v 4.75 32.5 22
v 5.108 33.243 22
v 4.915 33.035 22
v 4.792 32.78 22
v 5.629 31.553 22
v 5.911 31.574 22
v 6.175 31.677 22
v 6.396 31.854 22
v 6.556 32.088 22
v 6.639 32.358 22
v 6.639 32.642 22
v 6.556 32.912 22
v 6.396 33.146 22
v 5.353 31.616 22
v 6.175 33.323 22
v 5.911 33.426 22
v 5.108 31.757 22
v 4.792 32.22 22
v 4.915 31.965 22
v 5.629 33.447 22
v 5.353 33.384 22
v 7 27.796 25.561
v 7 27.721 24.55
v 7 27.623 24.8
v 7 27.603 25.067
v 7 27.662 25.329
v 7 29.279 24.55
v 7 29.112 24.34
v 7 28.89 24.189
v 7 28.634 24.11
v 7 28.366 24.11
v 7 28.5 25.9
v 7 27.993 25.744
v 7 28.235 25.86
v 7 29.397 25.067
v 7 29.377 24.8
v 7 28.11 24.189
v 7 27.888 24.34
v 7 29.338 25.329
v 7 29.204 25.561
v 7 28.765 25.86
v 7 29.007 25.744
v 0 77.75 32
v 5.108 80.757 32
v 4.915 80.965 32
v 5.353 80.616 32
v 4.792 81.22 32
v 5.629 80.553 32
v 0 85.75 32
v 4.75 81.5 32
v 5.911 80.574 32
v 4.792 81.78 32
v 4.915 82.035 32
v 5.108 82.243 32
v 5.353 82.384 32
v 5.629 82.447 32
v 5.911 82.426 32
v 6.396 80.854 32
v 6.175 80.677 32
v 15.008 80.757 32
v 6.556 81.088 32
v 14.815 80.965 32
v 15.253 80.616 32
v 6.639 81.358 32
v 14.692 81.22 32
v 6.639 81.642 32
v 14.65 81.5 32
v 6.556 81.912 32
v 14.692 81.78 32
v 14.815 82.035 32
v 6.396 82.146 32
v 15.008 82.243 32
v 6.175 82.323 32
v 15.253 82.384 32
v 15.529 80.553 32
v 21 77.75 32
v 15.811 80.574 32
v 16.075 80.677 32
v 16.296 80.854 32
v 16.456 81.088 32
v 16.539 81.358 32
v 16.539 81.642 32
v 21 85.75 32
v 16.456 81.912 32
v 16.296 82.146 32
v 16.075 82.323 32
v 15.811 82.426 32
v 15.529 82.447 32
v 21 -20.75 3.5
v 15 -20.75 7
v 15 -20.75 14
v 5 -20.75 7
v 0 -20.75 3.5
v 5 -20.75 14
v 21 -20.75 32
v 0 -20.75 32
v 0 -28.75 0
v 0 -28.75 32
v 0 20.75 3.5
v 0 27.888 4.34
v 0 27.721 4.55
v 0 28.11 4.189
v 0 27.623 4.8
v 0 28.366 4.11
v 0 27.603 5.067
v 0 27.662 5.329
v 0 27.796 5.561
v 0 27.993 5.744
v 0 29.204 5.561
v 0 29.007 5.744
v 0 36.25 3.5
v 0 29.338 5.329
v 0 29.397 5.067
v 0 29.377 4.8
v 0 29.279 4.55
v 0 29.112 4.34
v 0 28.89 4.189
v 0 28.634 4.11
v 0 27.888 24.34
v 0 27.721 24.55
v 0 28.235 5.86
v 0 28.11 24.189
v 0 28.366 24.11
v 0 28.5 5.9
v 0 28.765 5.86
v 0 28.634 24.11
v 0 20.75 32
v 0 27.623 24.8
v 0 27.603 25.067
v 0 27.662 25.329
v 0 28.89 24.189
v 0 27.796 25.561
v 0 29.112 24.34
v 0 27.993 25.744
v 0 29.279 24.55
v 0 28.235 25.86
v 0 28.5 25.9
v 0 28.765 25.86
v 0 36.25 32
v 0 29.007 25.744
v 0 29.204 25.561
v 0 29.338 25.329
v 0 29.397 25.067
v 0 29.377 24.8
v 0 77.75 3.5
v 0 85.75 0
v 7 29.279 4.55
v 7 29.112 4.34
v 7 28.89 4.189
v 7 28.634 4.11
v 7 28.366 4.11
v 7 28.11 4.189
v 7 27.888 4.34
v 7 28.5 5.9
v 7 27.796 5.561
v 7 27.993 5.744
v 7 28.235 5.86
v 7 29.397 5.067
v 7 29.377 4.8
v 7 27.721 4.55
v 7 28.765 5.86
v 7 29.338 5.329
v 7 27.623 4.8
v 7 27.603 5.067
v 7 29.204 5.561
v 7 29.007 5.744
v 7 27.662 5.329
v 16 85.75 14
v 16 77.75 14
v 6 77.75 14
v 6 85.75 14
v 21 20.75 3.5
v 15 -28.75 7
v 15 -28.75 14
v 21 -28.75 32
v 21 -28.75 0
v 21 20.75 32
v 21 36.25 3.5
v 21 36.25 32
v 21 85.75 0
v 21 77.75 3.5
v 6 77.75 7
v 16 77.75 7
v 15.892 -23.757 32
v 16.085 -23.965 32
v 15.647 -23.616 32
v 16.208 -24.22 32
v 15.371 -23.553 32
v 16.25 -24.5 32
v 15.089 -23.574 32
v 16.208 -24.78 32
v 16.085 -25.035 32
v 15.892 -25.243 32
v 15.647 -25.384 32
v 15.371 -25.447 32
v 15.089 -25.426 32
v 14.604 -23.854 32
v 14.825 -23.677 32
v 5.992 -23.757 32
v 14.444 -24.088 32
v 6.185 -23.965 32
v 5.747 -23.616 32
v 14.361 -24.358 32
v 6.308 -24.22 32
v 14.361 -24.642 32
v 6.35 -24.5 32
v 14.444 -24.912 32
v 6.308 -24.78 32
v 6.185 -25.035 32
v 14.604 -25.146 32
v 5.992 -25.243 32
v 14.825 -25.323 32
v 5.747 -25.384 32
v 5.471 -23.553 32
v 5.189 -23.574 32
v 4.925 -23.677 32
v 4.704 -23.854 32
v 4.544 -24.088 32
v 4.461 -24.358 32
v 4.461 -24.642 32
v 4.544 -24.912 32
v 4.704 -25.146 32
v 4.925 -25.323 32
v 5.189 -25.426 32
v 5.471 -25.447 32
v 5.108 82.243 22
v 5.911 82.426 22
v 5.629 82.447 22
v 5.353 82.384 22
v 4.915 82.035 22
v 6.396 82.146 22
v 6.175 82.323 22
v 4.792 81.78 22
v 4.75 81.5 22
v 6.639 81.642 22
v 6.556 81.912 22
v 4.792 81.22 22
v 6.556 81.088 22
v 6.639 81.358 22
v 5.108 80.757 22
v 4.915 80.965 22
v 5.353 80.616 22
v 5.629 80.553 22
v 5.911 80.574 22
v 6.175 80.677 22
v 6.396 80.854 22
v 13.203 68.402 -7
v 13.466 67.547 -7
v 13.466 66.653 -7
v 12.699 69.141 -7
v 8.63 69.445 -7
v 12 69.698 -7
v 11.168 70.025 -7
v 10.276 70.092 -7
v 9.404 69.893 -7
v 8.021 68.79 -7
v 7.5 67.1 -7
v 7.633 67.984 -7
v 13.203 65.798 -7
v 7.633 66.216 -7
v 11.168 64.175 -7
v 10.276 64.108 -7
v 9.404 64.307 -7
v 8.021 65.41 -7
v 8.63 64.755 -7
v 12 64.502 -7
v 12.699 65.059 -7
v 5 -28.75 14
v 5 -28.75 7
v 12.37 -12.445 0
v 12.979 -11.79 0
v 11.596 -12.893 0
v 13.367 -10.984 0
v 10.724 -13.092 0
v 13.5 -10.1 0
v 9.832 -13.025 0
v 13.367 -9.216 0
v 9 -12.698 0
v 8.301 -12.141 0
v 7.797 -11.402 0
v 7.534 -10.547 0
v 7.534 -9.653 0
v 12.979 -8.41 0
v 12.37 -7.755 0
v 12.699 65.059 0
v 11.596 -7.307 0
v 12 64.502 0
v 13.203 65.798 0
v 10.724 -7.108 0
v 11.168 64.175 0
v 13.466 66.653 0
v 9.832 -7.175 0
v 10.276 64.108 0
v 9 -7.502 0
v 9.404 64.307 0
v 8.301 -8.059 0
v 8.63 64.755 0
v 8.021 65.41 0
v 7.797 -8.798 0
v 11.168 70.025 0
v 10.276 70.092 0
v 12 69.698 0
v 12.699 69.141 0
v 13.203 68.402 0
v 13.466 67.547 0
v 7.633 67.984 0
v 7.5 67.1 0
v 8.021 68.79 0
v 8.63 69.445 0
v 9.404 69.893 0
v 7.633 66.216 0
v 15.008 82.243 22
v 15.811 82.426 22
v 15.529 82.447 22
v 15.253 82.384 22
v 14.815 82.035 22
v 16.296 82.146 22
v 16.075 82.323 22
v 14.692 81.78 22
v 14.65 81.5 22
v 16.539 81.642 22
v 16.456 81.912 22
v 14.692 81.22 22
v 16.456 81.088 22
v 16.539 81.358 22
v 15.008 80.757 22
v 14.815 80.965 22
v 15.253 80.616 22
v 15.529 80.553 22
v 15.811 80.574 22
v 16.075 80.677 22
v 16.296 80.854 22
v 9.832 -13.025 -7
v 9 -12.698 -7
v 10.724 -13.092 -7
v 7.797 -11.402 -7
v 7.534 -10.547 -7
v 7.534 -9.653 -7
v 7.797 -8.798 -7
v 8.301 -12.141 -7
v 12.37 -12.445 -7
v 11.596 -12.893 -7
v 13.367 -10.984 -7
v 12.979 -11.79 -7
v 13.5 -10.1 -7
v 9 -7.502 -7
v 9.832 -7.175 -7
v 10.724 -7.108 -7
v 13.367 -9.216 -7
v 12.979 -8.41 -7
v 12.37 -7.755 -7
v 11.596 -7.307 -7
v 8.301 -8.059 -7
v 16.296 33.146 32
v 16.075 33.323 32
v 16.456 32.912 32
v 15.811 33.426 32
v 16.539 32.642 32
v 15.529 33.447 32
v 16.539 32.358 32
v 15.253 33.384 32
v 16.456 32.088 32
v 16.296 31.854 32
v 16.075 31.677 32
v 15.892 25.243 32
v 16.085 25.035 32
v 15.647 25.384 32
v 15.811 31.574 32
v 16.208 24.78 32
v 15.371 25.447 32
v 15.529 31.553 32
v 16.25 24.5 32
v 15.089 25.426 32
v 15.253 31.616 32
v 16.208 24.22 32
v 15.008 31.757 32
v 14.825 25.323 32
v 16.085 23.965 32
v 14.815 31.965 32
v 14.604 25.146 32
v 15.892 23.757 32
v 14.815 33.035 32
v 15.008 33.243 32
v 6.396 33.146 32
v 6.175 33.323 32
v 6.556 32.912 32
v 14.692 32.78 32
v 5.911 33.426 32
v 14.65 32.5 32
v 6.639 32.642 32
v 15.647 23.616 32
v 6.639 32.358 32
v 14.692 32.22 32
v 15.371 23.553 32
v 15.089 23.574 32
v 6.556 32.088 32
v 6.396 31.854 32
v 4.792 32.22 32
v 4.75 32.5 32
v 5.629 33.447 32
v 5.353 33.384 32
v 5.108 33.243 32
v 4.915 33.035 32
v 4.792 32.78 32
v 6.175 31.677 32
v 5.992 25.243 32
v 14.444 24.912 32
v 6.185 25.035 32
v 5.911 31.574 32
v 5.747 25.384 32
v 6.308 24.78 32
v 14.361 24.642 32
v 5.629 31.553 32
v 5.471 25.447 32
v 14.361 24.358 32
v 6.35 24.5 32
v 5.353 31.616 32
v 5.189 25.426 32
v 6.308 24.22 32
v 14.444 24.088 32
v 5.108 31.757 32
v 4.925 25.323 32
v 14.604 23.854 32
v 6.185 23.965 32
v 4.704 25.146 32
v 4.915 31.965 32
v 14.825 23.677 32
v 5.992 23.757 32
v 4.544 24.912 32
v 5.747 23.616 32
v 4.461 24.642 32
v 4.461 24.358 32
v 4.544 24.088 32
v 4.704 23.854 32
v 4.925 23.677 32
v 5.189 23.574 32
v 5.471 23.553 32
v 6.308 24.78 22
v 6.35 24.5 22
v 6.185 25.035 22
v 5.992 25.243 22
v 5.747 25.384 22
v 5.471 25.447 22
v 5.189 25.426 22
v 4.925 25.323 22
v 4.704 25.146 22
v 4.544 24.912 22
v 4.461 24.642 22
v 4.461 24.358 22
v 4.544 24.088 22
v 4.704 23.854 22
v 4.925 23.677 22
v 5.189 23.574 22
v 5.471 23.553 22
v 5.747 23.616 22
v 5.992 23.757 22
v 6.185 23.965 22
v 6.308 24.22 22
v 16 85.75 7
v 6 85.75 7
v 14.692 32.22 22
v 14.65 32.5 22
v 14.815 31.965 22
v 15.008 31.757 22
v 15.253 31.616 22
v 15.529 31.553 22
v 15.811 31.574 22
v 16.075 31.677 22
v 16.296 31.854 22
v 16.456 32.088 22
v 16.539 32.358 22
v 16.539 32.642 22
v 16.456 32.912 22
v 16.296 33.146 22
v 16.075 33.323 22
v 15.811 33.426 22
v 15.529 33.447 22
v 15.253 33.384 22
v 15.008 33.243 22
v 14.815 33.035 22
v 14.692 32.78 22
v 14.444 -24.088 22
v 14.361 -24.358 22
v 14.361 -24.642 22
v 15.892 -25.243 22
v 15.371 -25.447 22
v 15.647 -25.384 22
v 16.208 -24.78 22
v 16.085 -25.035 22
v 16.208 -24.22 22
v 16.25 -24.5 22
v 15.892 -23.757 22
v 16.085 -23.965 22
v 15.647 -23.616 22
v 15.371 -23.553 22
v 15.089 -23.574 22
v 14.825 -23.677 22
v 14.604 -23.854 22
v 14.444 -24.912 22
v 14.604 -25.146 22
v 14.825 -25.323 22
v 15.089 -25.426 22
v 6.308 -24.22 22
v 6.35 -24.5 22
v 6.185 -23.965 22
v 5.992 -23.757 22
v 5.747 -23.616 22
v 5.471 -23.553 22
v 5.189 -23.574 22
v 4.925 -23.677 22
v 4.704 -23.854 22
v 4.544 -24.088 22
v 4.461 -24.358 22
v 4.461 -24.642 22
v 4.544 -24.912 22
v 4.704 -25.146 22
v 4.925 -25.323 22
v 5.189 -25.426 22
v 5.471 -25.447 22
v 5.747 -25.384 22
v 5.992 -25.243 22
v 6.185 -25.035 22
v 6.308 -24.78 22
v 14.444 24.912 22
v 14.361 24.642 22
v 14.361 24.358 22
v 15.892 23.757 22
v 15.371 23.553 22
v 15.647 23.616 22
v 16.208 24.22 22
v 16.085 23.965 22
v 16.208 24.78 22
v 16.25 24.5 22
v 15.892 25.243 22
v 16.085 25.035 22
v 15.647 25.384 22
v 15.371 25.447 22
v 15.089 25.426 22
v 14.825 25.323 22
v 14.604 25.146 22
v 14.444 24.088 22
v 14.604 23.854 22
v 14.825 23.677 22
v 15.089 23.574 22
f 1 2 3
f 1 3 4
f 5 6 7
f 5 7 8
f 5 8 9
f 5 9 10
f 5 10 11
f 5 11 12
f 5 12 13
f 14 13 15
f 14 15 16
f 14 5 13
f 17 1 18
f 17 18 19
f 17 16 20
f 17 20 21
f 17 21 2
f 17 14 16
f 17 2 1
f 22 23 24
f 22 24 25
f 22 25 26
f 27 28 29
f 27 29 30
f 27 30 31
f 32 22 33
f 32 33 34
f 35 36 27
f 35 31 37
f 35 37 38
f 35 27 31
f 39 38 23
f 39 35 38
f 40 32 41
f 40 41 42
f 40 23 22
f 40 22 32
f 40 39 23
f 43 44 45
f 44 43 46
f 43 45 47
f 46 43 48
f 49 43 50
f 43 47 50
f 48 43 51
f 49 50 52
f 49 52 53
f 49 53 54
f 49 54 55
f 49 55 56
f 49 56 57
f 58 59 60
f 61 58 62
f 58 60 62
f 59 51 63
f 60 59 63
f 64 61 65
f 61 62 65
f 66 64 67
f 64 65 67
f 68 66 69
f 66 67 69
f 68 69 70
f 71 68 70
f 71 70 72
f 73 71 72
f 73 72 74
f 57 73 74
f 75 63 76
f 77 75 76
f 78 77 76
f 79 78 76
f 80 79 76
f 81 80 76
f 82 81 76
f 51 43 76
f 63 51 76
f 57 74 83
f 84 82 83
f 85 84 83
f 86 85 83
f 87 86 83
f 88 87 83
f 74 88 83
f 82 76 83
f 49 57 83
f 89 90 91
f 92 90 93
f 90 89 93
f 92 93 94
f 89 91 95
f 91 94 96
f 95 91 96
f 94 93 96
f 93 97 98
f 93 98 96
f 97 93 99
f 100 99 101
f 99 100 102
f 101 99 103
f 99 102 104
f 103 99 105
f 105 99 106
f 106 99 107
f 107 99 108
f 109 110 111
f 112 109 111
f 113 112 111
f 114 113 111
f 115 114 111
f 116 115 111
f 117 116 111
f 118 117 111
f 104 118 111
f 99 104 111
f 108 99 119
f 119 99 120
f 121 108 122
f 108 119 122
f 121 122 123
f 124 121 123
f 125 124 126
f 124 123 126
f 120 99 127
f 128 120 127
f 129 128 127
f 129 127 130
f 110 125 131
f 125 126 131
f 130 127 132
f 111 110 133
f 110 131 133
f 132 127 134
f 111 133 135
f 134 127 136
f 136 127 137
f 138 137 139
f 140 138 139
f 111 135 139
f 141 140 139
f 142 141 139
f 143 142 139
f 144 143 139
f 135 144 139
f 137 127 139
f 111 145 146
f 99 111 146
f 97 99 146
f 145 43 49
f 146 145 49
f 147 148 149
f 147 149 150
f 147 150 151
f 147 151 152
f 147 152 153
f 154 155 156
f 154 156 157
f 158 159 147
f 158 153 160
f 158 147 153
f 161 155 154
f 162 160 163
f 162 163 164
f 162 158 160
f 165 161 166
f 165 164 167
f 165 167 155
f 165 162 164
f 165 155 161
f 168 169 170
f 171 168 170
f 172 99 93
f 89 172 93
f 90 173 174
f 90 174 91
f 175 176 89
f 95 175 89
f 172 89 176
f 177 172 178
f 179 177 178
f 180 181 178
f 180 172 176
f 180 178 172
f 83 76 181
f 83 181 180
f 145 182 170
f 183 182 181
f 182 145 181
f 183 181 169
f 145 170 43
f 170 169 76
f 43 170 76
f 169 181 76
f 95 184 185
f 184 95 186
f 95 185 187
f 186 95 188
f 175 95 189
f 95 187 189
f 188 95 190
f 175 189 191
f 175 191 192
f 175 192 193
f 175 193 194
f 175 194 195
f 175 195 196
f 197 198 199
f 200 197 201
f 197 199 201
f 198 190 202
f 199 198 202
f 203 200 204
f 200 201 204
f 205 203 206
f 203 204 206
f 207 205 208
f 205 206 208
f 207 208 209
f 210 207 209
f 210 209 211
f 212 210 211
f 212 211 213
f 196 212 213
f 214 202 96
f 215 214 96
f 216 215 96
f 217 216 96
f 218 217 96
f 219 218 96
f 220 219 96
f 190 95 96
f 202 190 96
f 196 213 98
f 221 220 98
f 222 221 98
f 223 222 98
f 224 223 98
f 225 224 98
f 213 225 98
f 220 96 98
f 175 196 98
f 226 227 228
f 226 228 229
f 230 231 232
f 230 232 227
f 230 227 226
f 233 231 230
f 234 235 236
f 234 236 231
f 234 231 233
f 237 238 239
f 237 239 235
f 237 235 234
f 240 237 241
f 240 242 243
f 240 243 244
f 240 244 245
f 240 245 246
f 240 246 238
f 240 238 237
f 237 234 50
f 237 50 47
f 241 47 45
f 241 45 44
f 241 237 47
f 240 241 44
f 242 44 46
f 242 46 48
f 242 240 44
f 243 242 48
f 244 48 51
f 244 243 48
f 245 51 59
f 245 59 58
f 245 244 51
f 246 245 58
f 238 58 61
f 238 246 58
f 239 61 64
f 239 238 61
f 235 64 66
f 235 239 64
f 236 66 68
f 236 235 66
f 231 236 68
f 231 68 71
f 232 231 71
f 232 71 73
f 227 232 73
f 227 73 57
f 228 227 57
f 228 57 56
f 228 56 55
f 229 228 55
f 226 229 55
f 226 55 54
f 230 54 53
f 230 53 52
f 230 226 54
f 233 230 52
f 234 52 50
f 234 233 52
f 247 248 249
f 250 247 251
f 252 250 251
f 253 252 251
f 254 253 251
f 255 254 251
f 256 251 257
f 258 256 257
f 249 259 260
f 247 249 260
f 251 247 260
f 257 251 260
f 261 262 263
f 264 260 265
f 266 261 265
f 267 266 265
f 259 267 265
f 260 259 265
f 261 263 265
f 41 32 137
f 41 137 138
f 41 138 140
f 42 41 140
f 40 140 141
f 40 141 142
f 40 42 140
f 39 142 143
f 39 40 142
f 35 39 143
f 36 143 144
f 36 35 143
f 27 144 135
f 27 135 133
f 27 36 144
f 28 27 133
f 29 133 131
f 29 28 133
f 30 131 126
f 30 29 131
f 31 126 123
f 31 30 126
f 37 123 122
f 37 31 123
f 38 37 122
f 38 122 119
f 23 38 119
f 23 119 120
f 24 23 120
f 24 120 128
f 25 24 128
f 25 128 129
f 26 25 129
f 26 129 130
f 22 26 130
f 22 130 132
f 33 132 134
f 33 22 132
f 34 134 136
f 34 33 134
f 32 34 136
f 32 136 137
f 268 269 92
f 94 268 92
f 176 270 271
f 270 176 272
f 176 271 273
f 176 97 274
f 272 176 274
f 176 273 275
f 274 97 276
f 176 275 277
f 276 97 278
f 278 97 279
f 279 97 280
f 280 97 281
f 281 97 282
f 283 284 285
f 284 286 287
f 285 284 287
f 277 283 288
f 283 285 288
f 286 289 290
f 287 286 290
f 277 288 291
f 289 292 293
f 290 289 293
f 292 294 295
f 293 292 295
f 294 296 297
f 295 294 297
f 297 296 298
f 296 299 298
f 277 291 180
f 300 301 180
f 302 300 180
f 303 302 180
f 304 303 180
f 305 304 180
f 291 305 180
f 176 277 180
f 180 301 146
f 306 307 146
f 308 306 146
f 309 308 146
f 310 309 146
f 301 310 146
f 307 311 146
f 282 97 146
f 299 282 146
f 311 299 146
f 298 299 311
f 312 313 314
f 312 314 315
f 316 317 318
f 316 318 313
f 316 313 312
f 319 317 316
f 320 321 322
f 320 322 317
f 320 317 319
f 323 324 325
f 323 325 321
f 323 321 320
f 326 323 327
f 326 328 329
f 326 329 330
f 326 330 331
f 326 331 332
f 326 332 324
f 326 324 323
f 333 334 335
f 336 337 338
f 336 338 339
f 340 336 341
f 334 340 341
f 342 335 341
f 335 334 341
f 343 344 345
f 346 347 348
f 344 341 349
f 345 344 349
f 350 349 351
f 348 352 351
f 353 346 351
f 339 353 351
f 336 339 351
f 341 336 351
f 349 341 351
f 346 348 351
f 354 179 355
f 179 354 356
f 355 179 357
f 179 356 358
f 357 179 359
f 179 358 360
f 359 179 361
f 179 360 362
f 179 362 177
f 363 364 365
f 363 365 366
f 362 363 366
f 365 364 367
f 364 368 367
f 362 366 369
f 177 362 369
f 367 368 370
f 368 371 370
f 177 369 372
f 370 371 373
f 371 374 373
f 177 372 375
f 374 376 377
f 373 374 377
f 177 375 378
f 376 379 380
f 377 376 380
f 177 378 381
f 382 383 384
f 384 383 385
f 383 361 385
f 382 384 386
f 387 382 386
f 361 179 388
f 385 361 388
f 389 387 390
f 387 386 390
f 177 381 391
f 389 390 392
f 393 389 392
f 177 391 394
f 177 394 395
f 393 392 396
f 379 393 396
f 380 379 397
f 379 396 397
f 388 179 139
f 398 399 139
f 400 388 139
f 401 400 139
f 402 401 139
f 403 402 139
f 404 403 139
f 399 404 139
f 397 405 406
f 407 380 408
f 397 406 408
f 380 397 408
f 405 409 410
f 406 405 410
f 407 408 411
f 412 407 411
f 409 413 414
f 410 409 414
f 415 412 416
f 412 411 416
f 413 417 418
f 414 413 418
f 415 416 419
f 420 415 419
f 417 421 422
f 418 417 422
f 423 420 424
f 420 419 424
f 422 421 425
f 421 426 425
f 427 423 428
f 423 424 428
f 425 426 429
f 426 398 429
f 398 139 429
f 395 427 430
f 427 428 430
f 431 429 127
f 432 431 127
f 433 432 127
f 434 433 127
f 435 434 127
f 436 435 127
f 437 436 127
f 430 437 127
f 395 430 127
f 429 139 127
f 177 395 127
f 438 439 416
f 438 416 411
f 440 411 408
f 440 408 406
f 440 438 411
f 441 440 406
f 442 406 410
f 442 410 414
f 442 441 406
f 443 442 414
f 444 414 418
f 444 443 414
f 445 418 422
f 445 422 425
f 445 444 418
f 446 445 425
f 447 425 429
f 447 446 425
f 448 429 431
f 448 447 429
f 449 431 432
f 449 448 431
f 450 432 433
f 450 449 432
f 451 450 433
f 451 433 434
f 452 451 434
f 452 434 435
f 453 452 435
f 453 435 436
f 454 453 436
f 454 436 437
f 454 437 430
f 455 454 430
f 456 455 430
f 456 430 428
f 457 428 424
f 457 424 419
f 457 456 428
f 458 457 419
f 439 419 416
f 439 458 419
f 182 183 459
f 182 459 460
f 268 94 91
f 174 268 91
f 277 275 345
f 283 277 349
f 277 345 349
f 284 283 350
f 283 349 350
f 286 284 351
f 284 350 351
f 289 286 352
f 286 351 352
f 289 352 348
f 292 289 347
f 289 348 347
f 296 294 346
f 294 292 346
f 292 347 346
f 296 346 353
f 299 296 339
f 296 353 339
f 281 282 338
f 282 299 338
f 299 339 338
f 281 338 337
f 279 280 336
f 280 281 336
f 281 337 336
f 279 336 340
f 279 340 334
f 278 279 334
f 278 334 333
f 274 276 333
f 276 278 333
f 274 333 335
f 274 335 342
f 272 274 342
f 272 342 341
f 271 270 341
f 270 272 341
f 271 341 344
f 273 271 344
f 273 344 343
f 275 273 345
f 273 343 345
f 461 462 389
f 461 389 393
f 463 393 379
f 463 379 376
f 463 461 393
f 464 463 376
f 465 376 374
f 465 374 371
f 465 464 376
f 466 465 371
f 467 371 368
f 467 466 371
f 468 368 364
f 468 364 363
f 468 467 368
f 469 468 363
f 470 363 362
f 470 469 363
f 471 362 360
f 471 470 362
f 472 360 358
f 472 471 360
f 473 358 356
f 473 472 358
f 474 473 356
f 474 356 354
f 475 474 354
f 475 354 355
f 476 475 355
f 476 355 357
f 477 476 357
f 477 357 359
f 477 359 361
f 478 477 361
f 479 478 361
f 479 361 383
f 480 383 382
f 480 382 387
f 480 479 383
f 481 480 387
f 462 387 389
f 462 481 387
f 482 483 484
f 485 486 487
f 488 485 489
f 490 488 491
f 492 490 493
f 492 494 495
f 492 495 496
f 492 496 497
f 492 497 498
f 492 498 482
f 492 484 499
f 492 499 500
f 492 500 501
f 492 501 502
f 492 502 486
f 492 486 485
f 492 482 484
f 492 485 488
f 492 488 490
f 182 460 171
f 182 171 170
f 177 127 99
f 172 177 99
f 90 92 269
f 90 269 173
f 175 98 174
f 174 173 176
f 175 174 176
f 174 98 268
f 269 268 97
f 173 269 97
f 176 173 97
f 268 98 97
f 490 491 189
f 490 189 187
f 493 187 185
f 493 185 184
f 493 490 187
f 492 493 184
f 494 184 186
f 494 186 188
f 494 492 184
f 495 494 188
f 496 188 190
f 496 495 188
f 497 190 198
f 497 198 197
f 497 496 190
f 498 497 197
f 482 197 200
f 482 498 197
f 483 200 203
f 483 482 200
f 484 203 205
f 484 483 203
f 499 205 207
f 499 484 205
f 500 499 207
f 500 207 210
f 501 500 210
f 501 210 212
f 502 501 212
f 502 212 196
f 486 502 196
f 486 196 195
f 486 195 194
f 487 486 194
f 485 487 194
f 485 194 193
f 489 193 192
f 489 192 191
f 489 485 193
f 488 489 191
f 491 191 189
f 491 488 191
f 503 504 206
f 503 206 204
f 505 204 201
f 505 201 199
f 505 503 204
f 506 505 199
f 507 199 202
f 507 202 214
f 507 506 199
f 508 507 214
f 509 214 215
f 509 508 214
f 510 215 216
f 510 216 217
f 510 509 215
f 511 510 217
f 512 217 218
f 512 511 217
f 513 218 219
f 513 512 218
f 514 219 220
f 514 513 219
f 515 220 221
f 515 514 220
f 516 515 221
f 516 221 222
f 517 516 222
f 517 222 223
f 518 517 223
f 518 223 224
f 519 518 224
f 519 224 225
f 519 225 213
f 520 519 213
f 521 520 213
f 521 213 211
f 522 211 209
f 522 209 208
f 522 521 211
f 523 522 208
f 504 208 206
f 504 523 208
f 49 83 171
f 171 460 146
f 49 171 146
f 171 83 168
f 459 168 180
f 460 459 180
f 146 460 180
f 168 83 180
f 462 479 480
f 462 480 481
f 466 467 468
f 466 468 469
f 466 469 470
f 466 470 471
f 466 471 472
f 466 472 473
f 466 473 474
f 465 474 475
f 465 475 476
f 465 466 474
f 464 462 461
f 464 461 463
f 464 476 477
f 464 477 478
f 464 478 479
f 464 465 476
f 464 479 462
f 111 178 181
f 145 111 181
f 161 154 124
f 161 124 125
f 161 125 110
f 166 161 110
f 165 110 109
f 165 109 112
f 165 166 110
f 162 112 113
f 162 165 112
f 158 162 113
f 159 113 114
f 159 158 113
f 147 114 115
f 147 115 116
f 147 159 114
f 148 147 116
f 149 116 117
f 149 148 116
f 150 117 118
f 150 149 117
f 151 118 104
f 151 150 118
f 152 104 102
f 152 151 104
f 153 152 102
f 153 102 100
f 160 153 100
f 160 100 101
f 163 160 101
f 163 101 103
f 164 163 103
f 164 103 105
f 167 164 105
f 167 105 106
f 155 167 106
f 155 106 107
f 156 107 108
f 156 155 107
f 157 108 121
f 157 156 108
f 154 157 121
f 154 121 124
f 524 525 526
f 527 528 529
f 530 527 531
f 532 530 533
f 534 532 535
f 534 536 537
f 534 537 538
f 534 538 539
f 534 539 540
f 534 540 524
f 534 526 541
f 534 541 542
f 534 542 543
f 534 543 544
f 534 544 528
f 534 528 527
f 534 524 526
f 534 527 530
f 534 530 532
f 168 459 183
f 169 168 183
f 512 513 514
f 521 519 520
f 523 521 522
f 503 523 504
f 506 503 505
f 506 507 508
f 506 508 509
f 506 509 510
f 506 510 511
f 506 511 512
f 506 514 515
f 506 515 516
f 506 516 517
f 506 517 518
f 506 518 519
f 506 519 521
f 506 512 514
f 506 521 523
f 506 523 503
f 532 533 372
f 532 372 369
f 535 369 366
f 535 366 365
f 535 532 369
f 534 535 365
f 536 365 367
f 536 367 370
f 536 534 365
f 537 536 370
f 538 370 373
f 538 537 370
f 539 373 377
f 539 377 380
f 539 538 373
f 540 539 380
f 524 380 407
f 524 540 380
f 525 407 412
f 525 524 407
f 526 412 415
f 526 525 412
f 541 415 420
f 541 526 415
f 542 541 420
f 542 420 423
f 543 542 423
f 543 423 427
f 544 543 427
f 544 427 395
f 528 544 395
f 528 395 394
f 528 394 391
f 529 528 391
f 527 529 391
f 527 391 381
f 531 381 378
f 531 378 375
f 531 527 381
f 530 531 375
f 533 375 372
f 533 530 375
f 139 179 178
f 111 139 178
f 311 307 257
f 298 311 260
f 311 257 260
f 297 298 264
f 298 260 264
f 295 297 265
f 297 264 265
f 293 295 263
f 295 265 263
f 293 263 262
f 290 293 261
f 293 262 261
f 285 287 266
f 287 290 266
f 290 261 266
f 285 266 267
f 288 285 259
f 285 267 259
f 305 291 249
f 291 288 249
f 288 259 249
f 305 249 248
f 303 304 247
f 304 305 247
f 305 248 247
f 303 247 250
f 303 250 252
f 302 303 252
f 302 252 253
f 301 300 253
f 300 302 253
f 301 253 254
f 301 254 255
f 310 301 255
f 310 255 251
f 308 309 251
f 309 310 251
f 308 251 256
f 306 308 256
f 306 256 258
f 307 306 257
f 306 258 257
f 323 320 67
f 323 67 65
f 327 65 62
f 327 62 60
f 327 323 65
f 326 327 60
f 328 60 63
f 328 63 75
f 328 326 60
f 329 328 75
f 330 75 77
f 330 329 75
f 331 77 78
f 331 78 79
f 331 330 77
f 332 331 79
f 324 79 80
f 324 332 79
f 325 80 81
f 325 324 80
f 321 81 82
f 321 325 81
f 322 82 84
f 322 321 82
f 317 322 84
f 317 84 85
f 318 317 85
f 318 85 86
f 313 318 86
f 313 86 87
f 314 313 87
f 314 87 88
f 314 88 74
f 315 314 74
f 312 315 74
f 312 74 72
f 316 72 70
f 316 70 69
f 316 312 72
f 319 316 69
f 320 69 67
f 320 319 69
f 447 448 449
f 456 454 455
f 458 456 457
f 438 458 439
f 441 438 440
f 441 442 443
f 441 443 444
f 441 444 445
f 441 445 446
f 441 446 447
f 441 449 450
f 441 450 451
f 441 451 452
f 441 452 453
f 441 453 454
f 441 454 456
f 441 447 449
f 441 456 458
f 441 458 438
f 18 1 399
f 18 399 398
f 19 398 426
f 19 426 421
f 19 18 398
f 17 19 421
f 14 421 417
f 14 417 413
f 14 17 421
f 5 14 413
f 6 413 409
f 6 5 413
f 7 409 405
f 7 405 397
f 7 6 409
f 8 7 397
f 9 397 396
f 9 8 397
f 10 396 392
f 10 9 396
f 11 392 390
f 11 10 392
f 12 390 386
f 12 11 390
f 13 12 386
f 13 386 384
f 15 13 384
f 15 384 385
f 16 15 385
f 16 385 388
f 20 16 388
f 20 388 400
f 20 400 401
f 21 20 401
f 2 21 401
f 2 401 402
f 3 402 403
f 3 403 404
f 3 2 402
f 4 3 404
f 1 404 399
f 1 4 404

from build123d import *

# Parameters (mm, degrees)
CYLINDER050_R             = 0.9
CYLINDER050_DEPTH         = 7
CYLINDER051_R             = 0.9
CYLINDER051_DEPTH         = 7
CYLINDER043_R             = 0.95
CYLINDER043_DEPTH         = 10
CYLINDER044_R             = 0.95
CYLINDER044_DEPTH         = 10
CYLINDER041_R             = 0.95
CYLINDER041_DEPTH         = 10
CYLINDER042_R             = 0.95
CYLINDER042_DEPTH         = 10
BOX007_W                  = 10
BOX007_H                  = 10
BOX007_DEPTH              = 7
PAD016_DEPTH              = 21
CYLINDER040_R             = 3
CYLINDER040_DEPTH         = 10
CYLINDER048_R             = 0.95
CYLINDER048_DEPTH         = 10
CYLINDER049_R             = 0.95
CYLINDER049_DEPTH         = 10
CYLINDER046_R             = 0.95
CYLINDER046_DEPTH         = 10
CYLINDER047_R             = 0.95
CYLINDER047_DEPTH         = 10
BOX008_W                  = 10
BOX008_H                  = 10
BOX008_DEPTH              = 7
PAD017_DEPTH              = 21
CYLINDER045_R             = 3
CYLINDER045_DEPTH         = 10
FUSION040_PLACEMENT_ANGLE = 180


with BuildPart() as cylinder050:
    # Cylinder050 → Cylinder050 (new body)
    with BuildSketch(Plane(origin=(7, 28.5, 25), x_dir=(0, 0, 1), z_dir=(-1, 0, 0))):
        Circle(CYLINDER050_R)
    extrude(amount=CYLINDER050_DEPTH)


with BuildPart() as fusion042:
    # Cylinder051 → Cylinder051 (new body)
    with BuildSketch(Plane(origin=(7, 28.5, 5), x_dir=(0, 0, 1), z_dir=(-1, 0, 0))):
        Circle(CYLINDER051_R)
    extrude(amount=CYLINDER051_DEPTH)

    # Fusion042: union Cylinder050
    add(cylinder050.part)


with BuildPart() as cylinder043:
    # Cylinder043 → Cylinder043 (new body)
    with BuildSketch(Plane(origin=(9.9, 0, 0), x_dir=(1, 0, 0), z_dir=(0, 0, 1))):
        Circle(CYLINDER043_R)
    extrude(amount=CYLINDER043_DEPTH)


with BuildPart() as tornillos015:
    # Cylinder044 → Cylinder044 (new body)
    with BuildSketch(Plane.XY):
        Circle(CYLINDER044_R)
    extrude(amount=CYLINDER044_DEPTH)

    # Fusion034: union Cylinder043
    add(cylinder043.part)


with BuildPart() as tornillos015_1:
    # Fusion034 placement: moved
    add(tornillos015.part.moved(Location((5, -24.5, 22))))


with BuildPart() as cylinder041:
    # Cylinder041 → Cylinder041 (new body)
    with BuildSketch(Plane(origin=(9.9, 0, 0), x_dir=(1, 0, 0), z_dir=(0, 0, 1))):
        Circle(CYLINDER041_R)
    extrude(amount=CYLINDER041_DEPTH)


with BuildPart() as fusion035:
    # Cylinder042 → Cylinder042 (new body)
    with BuildSketch(Plane.XY):
        Circle(CYLINDER042_R)
    extrude(amount=CYLINDER042_DEPTH)

    # Fusion033: union Cylinder041
    add(cylinder041.part)


with BuildPart() as fusion035_1:
    # Fusion033 placement: moved
    add(fusion035.part.moved(Location((5, 24.5, 22))))

    # Fusion035: union Tornillos015
    add(tornillos015_1.part)


with BuildPart() as fusion035_2:
    # Fusion035 placement: moved
    add(fusion035_1.part.moved(Location((0.4, 0, 0))))


with BuildPart() as cube007:
    # Box007 → Box007 (new body)
    with BuildSketch(Plane(origin=(5, -29, 7), x_dir=(1, 0, 0), z_dir=(0, 0, 1))):
        with Locations((5, 5)):
            Rectangle(BOX007_W, BOX007_H)
    extrude(amount=BOX007_DEPTH)


with BuildPart() as holder008:
    # Sketch016 → Pad016 (new body)
    with BuildSketch(Plane.YZ):
        Polygon((-28.75, 32), (-28.75, 0), (28.75, 0), (28.75, 32), (20.75, 32), (20.75, 3.5), (-20.75, 3.5), (-20.75, 32), align=None)
    extrude(amount=PAD016_DEPTH)

    # Cut022: cut Cube007
    add(cube007.part, mode=Mode.SUBTRACT)

    # Cut023: cut Fusion035
    add(fusion035_2.part, mode=Mode.SUBTRACT)


with BuildPart() as holderceje004:
    # Cylinder040 → Cylinder040 (new body)
    with BuildSketch(Plane(origin=(10.5, -10.1, -7), x_dir=(1, 0, 0), z_dir=(0, 0, 1))):
        Circle(CYLINDER040_R)
    extrude(amount=CYLINDER040_DEPTH)

    # Fusion036: union Holder008
    add(holder008.part)


with BuildPart() as cylinder048:
    # Cylinder048 → Cylinder048 (new body)
    with BuildSketch(Plane(origin=(9.9, 0, 0), x_dir=(1, 0, 0), z_dir=(0, 0, 1))):
        Circle(CYLINDER048_R)
    extrude(amount=CYLINDER048_DEPTH)


with BuildPart() as tornillos017:
    # Cylinder049 → Cylinder049 (new body)
    with BuildSketch(Plane.XY):
        Circle(CYLINDER049_R)
    extrude(amount=CYLINDER049_DEPTH)

    # Fusion038: union Cylinder048
    add(cylinder048.part)


with BuildPart() as tornillos017_1:
    # Fusion038 placement: moved
    add(tornillos017.part.moved(Location((5, -24.5, 22))))


with BuildPart() as cylinder046:
    # Cylinder046 → Cylinder046 (new body)
    with BuildSketch(Plane(origin=(9.9, 0, 0), x_dir=(1, 0, 0), z_dir=(0, 0, 1))):
        Circle(CYLINDER046_R)
    extrude(amount=CYLINDER046_DEPTH)


with BuildPart() as fusion039:
    # Cylinder047 → Cylinder047 (new body)
    with BuildSketch(Plane.XY):
        Circle(CYLINDER047_R)
    extrude(amount=CYLINDER047_DEPTH)

    # Fusion037: union Cylinder046
    add(cylinder046.part)


with BuildPart() as fusion039_1:
    # Fusion037 placement: moved
    add(fusion039.part.moved(Location((5, 24.5, 22))))

    # Fusion039: union Tornillos017
    add(tornillos017_1.part)


with BuildPart() as fusion039_2:
    # Fusion039 placement: moved
    add(fusion039_1.part.moved(Location((0.4, 0, 0))))


with BuildPart() as cube008:
    # Box008 → Box008 (new body)
    with BuildSketch(Plane(origin=(5, -29, 7), x_dir=(1, 0, 0), z_dir=(0, 0, 1))):
        with Locations((5, 5)):
            Rectangle(BOX008_W, BOX008_H)
    extrude(amount=BOX008_DEPTH)


with BuildPart() as holder009:
    # Sketch017 → Pad017 (new body)
    with BuildSketch(Plane.YZ):
        Polygon((-28.75, 32), (-28.75, 0), (28.75, 0), (28.75, 32), (20.75, 32), (20.75, 3.5), (-20.75, 3.5), (-20.75, 32), align=None)
    extrude(amount=PAD017_DEPTH)

    # Cut024: cut Cube008
    add(cube008.part, mode=Mode.SUBTRACT)

    # Cut025: cut Fusion039
    add(fusion039_2.part, mode=Mode.SUBTRACT)


with BuildPart() as cut026:
    # Cylinder045 → Cylinder045 (new body)
    with BuildSketch(Plane(origin=(10.5, -10.1, -7), x_dir=(1, 0, 0), z_dir=(0, 0, 1))):
        Circle(CYLINDER045_R)
    extrude(amount=CYLINDER045_DEPTH)

    # Fusion040: union Holder009
    add(holder009.part)


with BuildPart() as cut026_1:
    # Fusion040 placement: moved
    add(cut026.part.moved(Location((21, 57, 0))).rotate(Axis((21, 57, 0), (0, 0, 1)), FUSION040_PLACEMENT_ANGLE))

    # Fusion041: union HolderCEje004
    add(holderceje004.part)

    # Cut026: cut Fusion042
    add(fusion042.part, mode=Mode.SUBTRACT)


solid = cut026_1.part
